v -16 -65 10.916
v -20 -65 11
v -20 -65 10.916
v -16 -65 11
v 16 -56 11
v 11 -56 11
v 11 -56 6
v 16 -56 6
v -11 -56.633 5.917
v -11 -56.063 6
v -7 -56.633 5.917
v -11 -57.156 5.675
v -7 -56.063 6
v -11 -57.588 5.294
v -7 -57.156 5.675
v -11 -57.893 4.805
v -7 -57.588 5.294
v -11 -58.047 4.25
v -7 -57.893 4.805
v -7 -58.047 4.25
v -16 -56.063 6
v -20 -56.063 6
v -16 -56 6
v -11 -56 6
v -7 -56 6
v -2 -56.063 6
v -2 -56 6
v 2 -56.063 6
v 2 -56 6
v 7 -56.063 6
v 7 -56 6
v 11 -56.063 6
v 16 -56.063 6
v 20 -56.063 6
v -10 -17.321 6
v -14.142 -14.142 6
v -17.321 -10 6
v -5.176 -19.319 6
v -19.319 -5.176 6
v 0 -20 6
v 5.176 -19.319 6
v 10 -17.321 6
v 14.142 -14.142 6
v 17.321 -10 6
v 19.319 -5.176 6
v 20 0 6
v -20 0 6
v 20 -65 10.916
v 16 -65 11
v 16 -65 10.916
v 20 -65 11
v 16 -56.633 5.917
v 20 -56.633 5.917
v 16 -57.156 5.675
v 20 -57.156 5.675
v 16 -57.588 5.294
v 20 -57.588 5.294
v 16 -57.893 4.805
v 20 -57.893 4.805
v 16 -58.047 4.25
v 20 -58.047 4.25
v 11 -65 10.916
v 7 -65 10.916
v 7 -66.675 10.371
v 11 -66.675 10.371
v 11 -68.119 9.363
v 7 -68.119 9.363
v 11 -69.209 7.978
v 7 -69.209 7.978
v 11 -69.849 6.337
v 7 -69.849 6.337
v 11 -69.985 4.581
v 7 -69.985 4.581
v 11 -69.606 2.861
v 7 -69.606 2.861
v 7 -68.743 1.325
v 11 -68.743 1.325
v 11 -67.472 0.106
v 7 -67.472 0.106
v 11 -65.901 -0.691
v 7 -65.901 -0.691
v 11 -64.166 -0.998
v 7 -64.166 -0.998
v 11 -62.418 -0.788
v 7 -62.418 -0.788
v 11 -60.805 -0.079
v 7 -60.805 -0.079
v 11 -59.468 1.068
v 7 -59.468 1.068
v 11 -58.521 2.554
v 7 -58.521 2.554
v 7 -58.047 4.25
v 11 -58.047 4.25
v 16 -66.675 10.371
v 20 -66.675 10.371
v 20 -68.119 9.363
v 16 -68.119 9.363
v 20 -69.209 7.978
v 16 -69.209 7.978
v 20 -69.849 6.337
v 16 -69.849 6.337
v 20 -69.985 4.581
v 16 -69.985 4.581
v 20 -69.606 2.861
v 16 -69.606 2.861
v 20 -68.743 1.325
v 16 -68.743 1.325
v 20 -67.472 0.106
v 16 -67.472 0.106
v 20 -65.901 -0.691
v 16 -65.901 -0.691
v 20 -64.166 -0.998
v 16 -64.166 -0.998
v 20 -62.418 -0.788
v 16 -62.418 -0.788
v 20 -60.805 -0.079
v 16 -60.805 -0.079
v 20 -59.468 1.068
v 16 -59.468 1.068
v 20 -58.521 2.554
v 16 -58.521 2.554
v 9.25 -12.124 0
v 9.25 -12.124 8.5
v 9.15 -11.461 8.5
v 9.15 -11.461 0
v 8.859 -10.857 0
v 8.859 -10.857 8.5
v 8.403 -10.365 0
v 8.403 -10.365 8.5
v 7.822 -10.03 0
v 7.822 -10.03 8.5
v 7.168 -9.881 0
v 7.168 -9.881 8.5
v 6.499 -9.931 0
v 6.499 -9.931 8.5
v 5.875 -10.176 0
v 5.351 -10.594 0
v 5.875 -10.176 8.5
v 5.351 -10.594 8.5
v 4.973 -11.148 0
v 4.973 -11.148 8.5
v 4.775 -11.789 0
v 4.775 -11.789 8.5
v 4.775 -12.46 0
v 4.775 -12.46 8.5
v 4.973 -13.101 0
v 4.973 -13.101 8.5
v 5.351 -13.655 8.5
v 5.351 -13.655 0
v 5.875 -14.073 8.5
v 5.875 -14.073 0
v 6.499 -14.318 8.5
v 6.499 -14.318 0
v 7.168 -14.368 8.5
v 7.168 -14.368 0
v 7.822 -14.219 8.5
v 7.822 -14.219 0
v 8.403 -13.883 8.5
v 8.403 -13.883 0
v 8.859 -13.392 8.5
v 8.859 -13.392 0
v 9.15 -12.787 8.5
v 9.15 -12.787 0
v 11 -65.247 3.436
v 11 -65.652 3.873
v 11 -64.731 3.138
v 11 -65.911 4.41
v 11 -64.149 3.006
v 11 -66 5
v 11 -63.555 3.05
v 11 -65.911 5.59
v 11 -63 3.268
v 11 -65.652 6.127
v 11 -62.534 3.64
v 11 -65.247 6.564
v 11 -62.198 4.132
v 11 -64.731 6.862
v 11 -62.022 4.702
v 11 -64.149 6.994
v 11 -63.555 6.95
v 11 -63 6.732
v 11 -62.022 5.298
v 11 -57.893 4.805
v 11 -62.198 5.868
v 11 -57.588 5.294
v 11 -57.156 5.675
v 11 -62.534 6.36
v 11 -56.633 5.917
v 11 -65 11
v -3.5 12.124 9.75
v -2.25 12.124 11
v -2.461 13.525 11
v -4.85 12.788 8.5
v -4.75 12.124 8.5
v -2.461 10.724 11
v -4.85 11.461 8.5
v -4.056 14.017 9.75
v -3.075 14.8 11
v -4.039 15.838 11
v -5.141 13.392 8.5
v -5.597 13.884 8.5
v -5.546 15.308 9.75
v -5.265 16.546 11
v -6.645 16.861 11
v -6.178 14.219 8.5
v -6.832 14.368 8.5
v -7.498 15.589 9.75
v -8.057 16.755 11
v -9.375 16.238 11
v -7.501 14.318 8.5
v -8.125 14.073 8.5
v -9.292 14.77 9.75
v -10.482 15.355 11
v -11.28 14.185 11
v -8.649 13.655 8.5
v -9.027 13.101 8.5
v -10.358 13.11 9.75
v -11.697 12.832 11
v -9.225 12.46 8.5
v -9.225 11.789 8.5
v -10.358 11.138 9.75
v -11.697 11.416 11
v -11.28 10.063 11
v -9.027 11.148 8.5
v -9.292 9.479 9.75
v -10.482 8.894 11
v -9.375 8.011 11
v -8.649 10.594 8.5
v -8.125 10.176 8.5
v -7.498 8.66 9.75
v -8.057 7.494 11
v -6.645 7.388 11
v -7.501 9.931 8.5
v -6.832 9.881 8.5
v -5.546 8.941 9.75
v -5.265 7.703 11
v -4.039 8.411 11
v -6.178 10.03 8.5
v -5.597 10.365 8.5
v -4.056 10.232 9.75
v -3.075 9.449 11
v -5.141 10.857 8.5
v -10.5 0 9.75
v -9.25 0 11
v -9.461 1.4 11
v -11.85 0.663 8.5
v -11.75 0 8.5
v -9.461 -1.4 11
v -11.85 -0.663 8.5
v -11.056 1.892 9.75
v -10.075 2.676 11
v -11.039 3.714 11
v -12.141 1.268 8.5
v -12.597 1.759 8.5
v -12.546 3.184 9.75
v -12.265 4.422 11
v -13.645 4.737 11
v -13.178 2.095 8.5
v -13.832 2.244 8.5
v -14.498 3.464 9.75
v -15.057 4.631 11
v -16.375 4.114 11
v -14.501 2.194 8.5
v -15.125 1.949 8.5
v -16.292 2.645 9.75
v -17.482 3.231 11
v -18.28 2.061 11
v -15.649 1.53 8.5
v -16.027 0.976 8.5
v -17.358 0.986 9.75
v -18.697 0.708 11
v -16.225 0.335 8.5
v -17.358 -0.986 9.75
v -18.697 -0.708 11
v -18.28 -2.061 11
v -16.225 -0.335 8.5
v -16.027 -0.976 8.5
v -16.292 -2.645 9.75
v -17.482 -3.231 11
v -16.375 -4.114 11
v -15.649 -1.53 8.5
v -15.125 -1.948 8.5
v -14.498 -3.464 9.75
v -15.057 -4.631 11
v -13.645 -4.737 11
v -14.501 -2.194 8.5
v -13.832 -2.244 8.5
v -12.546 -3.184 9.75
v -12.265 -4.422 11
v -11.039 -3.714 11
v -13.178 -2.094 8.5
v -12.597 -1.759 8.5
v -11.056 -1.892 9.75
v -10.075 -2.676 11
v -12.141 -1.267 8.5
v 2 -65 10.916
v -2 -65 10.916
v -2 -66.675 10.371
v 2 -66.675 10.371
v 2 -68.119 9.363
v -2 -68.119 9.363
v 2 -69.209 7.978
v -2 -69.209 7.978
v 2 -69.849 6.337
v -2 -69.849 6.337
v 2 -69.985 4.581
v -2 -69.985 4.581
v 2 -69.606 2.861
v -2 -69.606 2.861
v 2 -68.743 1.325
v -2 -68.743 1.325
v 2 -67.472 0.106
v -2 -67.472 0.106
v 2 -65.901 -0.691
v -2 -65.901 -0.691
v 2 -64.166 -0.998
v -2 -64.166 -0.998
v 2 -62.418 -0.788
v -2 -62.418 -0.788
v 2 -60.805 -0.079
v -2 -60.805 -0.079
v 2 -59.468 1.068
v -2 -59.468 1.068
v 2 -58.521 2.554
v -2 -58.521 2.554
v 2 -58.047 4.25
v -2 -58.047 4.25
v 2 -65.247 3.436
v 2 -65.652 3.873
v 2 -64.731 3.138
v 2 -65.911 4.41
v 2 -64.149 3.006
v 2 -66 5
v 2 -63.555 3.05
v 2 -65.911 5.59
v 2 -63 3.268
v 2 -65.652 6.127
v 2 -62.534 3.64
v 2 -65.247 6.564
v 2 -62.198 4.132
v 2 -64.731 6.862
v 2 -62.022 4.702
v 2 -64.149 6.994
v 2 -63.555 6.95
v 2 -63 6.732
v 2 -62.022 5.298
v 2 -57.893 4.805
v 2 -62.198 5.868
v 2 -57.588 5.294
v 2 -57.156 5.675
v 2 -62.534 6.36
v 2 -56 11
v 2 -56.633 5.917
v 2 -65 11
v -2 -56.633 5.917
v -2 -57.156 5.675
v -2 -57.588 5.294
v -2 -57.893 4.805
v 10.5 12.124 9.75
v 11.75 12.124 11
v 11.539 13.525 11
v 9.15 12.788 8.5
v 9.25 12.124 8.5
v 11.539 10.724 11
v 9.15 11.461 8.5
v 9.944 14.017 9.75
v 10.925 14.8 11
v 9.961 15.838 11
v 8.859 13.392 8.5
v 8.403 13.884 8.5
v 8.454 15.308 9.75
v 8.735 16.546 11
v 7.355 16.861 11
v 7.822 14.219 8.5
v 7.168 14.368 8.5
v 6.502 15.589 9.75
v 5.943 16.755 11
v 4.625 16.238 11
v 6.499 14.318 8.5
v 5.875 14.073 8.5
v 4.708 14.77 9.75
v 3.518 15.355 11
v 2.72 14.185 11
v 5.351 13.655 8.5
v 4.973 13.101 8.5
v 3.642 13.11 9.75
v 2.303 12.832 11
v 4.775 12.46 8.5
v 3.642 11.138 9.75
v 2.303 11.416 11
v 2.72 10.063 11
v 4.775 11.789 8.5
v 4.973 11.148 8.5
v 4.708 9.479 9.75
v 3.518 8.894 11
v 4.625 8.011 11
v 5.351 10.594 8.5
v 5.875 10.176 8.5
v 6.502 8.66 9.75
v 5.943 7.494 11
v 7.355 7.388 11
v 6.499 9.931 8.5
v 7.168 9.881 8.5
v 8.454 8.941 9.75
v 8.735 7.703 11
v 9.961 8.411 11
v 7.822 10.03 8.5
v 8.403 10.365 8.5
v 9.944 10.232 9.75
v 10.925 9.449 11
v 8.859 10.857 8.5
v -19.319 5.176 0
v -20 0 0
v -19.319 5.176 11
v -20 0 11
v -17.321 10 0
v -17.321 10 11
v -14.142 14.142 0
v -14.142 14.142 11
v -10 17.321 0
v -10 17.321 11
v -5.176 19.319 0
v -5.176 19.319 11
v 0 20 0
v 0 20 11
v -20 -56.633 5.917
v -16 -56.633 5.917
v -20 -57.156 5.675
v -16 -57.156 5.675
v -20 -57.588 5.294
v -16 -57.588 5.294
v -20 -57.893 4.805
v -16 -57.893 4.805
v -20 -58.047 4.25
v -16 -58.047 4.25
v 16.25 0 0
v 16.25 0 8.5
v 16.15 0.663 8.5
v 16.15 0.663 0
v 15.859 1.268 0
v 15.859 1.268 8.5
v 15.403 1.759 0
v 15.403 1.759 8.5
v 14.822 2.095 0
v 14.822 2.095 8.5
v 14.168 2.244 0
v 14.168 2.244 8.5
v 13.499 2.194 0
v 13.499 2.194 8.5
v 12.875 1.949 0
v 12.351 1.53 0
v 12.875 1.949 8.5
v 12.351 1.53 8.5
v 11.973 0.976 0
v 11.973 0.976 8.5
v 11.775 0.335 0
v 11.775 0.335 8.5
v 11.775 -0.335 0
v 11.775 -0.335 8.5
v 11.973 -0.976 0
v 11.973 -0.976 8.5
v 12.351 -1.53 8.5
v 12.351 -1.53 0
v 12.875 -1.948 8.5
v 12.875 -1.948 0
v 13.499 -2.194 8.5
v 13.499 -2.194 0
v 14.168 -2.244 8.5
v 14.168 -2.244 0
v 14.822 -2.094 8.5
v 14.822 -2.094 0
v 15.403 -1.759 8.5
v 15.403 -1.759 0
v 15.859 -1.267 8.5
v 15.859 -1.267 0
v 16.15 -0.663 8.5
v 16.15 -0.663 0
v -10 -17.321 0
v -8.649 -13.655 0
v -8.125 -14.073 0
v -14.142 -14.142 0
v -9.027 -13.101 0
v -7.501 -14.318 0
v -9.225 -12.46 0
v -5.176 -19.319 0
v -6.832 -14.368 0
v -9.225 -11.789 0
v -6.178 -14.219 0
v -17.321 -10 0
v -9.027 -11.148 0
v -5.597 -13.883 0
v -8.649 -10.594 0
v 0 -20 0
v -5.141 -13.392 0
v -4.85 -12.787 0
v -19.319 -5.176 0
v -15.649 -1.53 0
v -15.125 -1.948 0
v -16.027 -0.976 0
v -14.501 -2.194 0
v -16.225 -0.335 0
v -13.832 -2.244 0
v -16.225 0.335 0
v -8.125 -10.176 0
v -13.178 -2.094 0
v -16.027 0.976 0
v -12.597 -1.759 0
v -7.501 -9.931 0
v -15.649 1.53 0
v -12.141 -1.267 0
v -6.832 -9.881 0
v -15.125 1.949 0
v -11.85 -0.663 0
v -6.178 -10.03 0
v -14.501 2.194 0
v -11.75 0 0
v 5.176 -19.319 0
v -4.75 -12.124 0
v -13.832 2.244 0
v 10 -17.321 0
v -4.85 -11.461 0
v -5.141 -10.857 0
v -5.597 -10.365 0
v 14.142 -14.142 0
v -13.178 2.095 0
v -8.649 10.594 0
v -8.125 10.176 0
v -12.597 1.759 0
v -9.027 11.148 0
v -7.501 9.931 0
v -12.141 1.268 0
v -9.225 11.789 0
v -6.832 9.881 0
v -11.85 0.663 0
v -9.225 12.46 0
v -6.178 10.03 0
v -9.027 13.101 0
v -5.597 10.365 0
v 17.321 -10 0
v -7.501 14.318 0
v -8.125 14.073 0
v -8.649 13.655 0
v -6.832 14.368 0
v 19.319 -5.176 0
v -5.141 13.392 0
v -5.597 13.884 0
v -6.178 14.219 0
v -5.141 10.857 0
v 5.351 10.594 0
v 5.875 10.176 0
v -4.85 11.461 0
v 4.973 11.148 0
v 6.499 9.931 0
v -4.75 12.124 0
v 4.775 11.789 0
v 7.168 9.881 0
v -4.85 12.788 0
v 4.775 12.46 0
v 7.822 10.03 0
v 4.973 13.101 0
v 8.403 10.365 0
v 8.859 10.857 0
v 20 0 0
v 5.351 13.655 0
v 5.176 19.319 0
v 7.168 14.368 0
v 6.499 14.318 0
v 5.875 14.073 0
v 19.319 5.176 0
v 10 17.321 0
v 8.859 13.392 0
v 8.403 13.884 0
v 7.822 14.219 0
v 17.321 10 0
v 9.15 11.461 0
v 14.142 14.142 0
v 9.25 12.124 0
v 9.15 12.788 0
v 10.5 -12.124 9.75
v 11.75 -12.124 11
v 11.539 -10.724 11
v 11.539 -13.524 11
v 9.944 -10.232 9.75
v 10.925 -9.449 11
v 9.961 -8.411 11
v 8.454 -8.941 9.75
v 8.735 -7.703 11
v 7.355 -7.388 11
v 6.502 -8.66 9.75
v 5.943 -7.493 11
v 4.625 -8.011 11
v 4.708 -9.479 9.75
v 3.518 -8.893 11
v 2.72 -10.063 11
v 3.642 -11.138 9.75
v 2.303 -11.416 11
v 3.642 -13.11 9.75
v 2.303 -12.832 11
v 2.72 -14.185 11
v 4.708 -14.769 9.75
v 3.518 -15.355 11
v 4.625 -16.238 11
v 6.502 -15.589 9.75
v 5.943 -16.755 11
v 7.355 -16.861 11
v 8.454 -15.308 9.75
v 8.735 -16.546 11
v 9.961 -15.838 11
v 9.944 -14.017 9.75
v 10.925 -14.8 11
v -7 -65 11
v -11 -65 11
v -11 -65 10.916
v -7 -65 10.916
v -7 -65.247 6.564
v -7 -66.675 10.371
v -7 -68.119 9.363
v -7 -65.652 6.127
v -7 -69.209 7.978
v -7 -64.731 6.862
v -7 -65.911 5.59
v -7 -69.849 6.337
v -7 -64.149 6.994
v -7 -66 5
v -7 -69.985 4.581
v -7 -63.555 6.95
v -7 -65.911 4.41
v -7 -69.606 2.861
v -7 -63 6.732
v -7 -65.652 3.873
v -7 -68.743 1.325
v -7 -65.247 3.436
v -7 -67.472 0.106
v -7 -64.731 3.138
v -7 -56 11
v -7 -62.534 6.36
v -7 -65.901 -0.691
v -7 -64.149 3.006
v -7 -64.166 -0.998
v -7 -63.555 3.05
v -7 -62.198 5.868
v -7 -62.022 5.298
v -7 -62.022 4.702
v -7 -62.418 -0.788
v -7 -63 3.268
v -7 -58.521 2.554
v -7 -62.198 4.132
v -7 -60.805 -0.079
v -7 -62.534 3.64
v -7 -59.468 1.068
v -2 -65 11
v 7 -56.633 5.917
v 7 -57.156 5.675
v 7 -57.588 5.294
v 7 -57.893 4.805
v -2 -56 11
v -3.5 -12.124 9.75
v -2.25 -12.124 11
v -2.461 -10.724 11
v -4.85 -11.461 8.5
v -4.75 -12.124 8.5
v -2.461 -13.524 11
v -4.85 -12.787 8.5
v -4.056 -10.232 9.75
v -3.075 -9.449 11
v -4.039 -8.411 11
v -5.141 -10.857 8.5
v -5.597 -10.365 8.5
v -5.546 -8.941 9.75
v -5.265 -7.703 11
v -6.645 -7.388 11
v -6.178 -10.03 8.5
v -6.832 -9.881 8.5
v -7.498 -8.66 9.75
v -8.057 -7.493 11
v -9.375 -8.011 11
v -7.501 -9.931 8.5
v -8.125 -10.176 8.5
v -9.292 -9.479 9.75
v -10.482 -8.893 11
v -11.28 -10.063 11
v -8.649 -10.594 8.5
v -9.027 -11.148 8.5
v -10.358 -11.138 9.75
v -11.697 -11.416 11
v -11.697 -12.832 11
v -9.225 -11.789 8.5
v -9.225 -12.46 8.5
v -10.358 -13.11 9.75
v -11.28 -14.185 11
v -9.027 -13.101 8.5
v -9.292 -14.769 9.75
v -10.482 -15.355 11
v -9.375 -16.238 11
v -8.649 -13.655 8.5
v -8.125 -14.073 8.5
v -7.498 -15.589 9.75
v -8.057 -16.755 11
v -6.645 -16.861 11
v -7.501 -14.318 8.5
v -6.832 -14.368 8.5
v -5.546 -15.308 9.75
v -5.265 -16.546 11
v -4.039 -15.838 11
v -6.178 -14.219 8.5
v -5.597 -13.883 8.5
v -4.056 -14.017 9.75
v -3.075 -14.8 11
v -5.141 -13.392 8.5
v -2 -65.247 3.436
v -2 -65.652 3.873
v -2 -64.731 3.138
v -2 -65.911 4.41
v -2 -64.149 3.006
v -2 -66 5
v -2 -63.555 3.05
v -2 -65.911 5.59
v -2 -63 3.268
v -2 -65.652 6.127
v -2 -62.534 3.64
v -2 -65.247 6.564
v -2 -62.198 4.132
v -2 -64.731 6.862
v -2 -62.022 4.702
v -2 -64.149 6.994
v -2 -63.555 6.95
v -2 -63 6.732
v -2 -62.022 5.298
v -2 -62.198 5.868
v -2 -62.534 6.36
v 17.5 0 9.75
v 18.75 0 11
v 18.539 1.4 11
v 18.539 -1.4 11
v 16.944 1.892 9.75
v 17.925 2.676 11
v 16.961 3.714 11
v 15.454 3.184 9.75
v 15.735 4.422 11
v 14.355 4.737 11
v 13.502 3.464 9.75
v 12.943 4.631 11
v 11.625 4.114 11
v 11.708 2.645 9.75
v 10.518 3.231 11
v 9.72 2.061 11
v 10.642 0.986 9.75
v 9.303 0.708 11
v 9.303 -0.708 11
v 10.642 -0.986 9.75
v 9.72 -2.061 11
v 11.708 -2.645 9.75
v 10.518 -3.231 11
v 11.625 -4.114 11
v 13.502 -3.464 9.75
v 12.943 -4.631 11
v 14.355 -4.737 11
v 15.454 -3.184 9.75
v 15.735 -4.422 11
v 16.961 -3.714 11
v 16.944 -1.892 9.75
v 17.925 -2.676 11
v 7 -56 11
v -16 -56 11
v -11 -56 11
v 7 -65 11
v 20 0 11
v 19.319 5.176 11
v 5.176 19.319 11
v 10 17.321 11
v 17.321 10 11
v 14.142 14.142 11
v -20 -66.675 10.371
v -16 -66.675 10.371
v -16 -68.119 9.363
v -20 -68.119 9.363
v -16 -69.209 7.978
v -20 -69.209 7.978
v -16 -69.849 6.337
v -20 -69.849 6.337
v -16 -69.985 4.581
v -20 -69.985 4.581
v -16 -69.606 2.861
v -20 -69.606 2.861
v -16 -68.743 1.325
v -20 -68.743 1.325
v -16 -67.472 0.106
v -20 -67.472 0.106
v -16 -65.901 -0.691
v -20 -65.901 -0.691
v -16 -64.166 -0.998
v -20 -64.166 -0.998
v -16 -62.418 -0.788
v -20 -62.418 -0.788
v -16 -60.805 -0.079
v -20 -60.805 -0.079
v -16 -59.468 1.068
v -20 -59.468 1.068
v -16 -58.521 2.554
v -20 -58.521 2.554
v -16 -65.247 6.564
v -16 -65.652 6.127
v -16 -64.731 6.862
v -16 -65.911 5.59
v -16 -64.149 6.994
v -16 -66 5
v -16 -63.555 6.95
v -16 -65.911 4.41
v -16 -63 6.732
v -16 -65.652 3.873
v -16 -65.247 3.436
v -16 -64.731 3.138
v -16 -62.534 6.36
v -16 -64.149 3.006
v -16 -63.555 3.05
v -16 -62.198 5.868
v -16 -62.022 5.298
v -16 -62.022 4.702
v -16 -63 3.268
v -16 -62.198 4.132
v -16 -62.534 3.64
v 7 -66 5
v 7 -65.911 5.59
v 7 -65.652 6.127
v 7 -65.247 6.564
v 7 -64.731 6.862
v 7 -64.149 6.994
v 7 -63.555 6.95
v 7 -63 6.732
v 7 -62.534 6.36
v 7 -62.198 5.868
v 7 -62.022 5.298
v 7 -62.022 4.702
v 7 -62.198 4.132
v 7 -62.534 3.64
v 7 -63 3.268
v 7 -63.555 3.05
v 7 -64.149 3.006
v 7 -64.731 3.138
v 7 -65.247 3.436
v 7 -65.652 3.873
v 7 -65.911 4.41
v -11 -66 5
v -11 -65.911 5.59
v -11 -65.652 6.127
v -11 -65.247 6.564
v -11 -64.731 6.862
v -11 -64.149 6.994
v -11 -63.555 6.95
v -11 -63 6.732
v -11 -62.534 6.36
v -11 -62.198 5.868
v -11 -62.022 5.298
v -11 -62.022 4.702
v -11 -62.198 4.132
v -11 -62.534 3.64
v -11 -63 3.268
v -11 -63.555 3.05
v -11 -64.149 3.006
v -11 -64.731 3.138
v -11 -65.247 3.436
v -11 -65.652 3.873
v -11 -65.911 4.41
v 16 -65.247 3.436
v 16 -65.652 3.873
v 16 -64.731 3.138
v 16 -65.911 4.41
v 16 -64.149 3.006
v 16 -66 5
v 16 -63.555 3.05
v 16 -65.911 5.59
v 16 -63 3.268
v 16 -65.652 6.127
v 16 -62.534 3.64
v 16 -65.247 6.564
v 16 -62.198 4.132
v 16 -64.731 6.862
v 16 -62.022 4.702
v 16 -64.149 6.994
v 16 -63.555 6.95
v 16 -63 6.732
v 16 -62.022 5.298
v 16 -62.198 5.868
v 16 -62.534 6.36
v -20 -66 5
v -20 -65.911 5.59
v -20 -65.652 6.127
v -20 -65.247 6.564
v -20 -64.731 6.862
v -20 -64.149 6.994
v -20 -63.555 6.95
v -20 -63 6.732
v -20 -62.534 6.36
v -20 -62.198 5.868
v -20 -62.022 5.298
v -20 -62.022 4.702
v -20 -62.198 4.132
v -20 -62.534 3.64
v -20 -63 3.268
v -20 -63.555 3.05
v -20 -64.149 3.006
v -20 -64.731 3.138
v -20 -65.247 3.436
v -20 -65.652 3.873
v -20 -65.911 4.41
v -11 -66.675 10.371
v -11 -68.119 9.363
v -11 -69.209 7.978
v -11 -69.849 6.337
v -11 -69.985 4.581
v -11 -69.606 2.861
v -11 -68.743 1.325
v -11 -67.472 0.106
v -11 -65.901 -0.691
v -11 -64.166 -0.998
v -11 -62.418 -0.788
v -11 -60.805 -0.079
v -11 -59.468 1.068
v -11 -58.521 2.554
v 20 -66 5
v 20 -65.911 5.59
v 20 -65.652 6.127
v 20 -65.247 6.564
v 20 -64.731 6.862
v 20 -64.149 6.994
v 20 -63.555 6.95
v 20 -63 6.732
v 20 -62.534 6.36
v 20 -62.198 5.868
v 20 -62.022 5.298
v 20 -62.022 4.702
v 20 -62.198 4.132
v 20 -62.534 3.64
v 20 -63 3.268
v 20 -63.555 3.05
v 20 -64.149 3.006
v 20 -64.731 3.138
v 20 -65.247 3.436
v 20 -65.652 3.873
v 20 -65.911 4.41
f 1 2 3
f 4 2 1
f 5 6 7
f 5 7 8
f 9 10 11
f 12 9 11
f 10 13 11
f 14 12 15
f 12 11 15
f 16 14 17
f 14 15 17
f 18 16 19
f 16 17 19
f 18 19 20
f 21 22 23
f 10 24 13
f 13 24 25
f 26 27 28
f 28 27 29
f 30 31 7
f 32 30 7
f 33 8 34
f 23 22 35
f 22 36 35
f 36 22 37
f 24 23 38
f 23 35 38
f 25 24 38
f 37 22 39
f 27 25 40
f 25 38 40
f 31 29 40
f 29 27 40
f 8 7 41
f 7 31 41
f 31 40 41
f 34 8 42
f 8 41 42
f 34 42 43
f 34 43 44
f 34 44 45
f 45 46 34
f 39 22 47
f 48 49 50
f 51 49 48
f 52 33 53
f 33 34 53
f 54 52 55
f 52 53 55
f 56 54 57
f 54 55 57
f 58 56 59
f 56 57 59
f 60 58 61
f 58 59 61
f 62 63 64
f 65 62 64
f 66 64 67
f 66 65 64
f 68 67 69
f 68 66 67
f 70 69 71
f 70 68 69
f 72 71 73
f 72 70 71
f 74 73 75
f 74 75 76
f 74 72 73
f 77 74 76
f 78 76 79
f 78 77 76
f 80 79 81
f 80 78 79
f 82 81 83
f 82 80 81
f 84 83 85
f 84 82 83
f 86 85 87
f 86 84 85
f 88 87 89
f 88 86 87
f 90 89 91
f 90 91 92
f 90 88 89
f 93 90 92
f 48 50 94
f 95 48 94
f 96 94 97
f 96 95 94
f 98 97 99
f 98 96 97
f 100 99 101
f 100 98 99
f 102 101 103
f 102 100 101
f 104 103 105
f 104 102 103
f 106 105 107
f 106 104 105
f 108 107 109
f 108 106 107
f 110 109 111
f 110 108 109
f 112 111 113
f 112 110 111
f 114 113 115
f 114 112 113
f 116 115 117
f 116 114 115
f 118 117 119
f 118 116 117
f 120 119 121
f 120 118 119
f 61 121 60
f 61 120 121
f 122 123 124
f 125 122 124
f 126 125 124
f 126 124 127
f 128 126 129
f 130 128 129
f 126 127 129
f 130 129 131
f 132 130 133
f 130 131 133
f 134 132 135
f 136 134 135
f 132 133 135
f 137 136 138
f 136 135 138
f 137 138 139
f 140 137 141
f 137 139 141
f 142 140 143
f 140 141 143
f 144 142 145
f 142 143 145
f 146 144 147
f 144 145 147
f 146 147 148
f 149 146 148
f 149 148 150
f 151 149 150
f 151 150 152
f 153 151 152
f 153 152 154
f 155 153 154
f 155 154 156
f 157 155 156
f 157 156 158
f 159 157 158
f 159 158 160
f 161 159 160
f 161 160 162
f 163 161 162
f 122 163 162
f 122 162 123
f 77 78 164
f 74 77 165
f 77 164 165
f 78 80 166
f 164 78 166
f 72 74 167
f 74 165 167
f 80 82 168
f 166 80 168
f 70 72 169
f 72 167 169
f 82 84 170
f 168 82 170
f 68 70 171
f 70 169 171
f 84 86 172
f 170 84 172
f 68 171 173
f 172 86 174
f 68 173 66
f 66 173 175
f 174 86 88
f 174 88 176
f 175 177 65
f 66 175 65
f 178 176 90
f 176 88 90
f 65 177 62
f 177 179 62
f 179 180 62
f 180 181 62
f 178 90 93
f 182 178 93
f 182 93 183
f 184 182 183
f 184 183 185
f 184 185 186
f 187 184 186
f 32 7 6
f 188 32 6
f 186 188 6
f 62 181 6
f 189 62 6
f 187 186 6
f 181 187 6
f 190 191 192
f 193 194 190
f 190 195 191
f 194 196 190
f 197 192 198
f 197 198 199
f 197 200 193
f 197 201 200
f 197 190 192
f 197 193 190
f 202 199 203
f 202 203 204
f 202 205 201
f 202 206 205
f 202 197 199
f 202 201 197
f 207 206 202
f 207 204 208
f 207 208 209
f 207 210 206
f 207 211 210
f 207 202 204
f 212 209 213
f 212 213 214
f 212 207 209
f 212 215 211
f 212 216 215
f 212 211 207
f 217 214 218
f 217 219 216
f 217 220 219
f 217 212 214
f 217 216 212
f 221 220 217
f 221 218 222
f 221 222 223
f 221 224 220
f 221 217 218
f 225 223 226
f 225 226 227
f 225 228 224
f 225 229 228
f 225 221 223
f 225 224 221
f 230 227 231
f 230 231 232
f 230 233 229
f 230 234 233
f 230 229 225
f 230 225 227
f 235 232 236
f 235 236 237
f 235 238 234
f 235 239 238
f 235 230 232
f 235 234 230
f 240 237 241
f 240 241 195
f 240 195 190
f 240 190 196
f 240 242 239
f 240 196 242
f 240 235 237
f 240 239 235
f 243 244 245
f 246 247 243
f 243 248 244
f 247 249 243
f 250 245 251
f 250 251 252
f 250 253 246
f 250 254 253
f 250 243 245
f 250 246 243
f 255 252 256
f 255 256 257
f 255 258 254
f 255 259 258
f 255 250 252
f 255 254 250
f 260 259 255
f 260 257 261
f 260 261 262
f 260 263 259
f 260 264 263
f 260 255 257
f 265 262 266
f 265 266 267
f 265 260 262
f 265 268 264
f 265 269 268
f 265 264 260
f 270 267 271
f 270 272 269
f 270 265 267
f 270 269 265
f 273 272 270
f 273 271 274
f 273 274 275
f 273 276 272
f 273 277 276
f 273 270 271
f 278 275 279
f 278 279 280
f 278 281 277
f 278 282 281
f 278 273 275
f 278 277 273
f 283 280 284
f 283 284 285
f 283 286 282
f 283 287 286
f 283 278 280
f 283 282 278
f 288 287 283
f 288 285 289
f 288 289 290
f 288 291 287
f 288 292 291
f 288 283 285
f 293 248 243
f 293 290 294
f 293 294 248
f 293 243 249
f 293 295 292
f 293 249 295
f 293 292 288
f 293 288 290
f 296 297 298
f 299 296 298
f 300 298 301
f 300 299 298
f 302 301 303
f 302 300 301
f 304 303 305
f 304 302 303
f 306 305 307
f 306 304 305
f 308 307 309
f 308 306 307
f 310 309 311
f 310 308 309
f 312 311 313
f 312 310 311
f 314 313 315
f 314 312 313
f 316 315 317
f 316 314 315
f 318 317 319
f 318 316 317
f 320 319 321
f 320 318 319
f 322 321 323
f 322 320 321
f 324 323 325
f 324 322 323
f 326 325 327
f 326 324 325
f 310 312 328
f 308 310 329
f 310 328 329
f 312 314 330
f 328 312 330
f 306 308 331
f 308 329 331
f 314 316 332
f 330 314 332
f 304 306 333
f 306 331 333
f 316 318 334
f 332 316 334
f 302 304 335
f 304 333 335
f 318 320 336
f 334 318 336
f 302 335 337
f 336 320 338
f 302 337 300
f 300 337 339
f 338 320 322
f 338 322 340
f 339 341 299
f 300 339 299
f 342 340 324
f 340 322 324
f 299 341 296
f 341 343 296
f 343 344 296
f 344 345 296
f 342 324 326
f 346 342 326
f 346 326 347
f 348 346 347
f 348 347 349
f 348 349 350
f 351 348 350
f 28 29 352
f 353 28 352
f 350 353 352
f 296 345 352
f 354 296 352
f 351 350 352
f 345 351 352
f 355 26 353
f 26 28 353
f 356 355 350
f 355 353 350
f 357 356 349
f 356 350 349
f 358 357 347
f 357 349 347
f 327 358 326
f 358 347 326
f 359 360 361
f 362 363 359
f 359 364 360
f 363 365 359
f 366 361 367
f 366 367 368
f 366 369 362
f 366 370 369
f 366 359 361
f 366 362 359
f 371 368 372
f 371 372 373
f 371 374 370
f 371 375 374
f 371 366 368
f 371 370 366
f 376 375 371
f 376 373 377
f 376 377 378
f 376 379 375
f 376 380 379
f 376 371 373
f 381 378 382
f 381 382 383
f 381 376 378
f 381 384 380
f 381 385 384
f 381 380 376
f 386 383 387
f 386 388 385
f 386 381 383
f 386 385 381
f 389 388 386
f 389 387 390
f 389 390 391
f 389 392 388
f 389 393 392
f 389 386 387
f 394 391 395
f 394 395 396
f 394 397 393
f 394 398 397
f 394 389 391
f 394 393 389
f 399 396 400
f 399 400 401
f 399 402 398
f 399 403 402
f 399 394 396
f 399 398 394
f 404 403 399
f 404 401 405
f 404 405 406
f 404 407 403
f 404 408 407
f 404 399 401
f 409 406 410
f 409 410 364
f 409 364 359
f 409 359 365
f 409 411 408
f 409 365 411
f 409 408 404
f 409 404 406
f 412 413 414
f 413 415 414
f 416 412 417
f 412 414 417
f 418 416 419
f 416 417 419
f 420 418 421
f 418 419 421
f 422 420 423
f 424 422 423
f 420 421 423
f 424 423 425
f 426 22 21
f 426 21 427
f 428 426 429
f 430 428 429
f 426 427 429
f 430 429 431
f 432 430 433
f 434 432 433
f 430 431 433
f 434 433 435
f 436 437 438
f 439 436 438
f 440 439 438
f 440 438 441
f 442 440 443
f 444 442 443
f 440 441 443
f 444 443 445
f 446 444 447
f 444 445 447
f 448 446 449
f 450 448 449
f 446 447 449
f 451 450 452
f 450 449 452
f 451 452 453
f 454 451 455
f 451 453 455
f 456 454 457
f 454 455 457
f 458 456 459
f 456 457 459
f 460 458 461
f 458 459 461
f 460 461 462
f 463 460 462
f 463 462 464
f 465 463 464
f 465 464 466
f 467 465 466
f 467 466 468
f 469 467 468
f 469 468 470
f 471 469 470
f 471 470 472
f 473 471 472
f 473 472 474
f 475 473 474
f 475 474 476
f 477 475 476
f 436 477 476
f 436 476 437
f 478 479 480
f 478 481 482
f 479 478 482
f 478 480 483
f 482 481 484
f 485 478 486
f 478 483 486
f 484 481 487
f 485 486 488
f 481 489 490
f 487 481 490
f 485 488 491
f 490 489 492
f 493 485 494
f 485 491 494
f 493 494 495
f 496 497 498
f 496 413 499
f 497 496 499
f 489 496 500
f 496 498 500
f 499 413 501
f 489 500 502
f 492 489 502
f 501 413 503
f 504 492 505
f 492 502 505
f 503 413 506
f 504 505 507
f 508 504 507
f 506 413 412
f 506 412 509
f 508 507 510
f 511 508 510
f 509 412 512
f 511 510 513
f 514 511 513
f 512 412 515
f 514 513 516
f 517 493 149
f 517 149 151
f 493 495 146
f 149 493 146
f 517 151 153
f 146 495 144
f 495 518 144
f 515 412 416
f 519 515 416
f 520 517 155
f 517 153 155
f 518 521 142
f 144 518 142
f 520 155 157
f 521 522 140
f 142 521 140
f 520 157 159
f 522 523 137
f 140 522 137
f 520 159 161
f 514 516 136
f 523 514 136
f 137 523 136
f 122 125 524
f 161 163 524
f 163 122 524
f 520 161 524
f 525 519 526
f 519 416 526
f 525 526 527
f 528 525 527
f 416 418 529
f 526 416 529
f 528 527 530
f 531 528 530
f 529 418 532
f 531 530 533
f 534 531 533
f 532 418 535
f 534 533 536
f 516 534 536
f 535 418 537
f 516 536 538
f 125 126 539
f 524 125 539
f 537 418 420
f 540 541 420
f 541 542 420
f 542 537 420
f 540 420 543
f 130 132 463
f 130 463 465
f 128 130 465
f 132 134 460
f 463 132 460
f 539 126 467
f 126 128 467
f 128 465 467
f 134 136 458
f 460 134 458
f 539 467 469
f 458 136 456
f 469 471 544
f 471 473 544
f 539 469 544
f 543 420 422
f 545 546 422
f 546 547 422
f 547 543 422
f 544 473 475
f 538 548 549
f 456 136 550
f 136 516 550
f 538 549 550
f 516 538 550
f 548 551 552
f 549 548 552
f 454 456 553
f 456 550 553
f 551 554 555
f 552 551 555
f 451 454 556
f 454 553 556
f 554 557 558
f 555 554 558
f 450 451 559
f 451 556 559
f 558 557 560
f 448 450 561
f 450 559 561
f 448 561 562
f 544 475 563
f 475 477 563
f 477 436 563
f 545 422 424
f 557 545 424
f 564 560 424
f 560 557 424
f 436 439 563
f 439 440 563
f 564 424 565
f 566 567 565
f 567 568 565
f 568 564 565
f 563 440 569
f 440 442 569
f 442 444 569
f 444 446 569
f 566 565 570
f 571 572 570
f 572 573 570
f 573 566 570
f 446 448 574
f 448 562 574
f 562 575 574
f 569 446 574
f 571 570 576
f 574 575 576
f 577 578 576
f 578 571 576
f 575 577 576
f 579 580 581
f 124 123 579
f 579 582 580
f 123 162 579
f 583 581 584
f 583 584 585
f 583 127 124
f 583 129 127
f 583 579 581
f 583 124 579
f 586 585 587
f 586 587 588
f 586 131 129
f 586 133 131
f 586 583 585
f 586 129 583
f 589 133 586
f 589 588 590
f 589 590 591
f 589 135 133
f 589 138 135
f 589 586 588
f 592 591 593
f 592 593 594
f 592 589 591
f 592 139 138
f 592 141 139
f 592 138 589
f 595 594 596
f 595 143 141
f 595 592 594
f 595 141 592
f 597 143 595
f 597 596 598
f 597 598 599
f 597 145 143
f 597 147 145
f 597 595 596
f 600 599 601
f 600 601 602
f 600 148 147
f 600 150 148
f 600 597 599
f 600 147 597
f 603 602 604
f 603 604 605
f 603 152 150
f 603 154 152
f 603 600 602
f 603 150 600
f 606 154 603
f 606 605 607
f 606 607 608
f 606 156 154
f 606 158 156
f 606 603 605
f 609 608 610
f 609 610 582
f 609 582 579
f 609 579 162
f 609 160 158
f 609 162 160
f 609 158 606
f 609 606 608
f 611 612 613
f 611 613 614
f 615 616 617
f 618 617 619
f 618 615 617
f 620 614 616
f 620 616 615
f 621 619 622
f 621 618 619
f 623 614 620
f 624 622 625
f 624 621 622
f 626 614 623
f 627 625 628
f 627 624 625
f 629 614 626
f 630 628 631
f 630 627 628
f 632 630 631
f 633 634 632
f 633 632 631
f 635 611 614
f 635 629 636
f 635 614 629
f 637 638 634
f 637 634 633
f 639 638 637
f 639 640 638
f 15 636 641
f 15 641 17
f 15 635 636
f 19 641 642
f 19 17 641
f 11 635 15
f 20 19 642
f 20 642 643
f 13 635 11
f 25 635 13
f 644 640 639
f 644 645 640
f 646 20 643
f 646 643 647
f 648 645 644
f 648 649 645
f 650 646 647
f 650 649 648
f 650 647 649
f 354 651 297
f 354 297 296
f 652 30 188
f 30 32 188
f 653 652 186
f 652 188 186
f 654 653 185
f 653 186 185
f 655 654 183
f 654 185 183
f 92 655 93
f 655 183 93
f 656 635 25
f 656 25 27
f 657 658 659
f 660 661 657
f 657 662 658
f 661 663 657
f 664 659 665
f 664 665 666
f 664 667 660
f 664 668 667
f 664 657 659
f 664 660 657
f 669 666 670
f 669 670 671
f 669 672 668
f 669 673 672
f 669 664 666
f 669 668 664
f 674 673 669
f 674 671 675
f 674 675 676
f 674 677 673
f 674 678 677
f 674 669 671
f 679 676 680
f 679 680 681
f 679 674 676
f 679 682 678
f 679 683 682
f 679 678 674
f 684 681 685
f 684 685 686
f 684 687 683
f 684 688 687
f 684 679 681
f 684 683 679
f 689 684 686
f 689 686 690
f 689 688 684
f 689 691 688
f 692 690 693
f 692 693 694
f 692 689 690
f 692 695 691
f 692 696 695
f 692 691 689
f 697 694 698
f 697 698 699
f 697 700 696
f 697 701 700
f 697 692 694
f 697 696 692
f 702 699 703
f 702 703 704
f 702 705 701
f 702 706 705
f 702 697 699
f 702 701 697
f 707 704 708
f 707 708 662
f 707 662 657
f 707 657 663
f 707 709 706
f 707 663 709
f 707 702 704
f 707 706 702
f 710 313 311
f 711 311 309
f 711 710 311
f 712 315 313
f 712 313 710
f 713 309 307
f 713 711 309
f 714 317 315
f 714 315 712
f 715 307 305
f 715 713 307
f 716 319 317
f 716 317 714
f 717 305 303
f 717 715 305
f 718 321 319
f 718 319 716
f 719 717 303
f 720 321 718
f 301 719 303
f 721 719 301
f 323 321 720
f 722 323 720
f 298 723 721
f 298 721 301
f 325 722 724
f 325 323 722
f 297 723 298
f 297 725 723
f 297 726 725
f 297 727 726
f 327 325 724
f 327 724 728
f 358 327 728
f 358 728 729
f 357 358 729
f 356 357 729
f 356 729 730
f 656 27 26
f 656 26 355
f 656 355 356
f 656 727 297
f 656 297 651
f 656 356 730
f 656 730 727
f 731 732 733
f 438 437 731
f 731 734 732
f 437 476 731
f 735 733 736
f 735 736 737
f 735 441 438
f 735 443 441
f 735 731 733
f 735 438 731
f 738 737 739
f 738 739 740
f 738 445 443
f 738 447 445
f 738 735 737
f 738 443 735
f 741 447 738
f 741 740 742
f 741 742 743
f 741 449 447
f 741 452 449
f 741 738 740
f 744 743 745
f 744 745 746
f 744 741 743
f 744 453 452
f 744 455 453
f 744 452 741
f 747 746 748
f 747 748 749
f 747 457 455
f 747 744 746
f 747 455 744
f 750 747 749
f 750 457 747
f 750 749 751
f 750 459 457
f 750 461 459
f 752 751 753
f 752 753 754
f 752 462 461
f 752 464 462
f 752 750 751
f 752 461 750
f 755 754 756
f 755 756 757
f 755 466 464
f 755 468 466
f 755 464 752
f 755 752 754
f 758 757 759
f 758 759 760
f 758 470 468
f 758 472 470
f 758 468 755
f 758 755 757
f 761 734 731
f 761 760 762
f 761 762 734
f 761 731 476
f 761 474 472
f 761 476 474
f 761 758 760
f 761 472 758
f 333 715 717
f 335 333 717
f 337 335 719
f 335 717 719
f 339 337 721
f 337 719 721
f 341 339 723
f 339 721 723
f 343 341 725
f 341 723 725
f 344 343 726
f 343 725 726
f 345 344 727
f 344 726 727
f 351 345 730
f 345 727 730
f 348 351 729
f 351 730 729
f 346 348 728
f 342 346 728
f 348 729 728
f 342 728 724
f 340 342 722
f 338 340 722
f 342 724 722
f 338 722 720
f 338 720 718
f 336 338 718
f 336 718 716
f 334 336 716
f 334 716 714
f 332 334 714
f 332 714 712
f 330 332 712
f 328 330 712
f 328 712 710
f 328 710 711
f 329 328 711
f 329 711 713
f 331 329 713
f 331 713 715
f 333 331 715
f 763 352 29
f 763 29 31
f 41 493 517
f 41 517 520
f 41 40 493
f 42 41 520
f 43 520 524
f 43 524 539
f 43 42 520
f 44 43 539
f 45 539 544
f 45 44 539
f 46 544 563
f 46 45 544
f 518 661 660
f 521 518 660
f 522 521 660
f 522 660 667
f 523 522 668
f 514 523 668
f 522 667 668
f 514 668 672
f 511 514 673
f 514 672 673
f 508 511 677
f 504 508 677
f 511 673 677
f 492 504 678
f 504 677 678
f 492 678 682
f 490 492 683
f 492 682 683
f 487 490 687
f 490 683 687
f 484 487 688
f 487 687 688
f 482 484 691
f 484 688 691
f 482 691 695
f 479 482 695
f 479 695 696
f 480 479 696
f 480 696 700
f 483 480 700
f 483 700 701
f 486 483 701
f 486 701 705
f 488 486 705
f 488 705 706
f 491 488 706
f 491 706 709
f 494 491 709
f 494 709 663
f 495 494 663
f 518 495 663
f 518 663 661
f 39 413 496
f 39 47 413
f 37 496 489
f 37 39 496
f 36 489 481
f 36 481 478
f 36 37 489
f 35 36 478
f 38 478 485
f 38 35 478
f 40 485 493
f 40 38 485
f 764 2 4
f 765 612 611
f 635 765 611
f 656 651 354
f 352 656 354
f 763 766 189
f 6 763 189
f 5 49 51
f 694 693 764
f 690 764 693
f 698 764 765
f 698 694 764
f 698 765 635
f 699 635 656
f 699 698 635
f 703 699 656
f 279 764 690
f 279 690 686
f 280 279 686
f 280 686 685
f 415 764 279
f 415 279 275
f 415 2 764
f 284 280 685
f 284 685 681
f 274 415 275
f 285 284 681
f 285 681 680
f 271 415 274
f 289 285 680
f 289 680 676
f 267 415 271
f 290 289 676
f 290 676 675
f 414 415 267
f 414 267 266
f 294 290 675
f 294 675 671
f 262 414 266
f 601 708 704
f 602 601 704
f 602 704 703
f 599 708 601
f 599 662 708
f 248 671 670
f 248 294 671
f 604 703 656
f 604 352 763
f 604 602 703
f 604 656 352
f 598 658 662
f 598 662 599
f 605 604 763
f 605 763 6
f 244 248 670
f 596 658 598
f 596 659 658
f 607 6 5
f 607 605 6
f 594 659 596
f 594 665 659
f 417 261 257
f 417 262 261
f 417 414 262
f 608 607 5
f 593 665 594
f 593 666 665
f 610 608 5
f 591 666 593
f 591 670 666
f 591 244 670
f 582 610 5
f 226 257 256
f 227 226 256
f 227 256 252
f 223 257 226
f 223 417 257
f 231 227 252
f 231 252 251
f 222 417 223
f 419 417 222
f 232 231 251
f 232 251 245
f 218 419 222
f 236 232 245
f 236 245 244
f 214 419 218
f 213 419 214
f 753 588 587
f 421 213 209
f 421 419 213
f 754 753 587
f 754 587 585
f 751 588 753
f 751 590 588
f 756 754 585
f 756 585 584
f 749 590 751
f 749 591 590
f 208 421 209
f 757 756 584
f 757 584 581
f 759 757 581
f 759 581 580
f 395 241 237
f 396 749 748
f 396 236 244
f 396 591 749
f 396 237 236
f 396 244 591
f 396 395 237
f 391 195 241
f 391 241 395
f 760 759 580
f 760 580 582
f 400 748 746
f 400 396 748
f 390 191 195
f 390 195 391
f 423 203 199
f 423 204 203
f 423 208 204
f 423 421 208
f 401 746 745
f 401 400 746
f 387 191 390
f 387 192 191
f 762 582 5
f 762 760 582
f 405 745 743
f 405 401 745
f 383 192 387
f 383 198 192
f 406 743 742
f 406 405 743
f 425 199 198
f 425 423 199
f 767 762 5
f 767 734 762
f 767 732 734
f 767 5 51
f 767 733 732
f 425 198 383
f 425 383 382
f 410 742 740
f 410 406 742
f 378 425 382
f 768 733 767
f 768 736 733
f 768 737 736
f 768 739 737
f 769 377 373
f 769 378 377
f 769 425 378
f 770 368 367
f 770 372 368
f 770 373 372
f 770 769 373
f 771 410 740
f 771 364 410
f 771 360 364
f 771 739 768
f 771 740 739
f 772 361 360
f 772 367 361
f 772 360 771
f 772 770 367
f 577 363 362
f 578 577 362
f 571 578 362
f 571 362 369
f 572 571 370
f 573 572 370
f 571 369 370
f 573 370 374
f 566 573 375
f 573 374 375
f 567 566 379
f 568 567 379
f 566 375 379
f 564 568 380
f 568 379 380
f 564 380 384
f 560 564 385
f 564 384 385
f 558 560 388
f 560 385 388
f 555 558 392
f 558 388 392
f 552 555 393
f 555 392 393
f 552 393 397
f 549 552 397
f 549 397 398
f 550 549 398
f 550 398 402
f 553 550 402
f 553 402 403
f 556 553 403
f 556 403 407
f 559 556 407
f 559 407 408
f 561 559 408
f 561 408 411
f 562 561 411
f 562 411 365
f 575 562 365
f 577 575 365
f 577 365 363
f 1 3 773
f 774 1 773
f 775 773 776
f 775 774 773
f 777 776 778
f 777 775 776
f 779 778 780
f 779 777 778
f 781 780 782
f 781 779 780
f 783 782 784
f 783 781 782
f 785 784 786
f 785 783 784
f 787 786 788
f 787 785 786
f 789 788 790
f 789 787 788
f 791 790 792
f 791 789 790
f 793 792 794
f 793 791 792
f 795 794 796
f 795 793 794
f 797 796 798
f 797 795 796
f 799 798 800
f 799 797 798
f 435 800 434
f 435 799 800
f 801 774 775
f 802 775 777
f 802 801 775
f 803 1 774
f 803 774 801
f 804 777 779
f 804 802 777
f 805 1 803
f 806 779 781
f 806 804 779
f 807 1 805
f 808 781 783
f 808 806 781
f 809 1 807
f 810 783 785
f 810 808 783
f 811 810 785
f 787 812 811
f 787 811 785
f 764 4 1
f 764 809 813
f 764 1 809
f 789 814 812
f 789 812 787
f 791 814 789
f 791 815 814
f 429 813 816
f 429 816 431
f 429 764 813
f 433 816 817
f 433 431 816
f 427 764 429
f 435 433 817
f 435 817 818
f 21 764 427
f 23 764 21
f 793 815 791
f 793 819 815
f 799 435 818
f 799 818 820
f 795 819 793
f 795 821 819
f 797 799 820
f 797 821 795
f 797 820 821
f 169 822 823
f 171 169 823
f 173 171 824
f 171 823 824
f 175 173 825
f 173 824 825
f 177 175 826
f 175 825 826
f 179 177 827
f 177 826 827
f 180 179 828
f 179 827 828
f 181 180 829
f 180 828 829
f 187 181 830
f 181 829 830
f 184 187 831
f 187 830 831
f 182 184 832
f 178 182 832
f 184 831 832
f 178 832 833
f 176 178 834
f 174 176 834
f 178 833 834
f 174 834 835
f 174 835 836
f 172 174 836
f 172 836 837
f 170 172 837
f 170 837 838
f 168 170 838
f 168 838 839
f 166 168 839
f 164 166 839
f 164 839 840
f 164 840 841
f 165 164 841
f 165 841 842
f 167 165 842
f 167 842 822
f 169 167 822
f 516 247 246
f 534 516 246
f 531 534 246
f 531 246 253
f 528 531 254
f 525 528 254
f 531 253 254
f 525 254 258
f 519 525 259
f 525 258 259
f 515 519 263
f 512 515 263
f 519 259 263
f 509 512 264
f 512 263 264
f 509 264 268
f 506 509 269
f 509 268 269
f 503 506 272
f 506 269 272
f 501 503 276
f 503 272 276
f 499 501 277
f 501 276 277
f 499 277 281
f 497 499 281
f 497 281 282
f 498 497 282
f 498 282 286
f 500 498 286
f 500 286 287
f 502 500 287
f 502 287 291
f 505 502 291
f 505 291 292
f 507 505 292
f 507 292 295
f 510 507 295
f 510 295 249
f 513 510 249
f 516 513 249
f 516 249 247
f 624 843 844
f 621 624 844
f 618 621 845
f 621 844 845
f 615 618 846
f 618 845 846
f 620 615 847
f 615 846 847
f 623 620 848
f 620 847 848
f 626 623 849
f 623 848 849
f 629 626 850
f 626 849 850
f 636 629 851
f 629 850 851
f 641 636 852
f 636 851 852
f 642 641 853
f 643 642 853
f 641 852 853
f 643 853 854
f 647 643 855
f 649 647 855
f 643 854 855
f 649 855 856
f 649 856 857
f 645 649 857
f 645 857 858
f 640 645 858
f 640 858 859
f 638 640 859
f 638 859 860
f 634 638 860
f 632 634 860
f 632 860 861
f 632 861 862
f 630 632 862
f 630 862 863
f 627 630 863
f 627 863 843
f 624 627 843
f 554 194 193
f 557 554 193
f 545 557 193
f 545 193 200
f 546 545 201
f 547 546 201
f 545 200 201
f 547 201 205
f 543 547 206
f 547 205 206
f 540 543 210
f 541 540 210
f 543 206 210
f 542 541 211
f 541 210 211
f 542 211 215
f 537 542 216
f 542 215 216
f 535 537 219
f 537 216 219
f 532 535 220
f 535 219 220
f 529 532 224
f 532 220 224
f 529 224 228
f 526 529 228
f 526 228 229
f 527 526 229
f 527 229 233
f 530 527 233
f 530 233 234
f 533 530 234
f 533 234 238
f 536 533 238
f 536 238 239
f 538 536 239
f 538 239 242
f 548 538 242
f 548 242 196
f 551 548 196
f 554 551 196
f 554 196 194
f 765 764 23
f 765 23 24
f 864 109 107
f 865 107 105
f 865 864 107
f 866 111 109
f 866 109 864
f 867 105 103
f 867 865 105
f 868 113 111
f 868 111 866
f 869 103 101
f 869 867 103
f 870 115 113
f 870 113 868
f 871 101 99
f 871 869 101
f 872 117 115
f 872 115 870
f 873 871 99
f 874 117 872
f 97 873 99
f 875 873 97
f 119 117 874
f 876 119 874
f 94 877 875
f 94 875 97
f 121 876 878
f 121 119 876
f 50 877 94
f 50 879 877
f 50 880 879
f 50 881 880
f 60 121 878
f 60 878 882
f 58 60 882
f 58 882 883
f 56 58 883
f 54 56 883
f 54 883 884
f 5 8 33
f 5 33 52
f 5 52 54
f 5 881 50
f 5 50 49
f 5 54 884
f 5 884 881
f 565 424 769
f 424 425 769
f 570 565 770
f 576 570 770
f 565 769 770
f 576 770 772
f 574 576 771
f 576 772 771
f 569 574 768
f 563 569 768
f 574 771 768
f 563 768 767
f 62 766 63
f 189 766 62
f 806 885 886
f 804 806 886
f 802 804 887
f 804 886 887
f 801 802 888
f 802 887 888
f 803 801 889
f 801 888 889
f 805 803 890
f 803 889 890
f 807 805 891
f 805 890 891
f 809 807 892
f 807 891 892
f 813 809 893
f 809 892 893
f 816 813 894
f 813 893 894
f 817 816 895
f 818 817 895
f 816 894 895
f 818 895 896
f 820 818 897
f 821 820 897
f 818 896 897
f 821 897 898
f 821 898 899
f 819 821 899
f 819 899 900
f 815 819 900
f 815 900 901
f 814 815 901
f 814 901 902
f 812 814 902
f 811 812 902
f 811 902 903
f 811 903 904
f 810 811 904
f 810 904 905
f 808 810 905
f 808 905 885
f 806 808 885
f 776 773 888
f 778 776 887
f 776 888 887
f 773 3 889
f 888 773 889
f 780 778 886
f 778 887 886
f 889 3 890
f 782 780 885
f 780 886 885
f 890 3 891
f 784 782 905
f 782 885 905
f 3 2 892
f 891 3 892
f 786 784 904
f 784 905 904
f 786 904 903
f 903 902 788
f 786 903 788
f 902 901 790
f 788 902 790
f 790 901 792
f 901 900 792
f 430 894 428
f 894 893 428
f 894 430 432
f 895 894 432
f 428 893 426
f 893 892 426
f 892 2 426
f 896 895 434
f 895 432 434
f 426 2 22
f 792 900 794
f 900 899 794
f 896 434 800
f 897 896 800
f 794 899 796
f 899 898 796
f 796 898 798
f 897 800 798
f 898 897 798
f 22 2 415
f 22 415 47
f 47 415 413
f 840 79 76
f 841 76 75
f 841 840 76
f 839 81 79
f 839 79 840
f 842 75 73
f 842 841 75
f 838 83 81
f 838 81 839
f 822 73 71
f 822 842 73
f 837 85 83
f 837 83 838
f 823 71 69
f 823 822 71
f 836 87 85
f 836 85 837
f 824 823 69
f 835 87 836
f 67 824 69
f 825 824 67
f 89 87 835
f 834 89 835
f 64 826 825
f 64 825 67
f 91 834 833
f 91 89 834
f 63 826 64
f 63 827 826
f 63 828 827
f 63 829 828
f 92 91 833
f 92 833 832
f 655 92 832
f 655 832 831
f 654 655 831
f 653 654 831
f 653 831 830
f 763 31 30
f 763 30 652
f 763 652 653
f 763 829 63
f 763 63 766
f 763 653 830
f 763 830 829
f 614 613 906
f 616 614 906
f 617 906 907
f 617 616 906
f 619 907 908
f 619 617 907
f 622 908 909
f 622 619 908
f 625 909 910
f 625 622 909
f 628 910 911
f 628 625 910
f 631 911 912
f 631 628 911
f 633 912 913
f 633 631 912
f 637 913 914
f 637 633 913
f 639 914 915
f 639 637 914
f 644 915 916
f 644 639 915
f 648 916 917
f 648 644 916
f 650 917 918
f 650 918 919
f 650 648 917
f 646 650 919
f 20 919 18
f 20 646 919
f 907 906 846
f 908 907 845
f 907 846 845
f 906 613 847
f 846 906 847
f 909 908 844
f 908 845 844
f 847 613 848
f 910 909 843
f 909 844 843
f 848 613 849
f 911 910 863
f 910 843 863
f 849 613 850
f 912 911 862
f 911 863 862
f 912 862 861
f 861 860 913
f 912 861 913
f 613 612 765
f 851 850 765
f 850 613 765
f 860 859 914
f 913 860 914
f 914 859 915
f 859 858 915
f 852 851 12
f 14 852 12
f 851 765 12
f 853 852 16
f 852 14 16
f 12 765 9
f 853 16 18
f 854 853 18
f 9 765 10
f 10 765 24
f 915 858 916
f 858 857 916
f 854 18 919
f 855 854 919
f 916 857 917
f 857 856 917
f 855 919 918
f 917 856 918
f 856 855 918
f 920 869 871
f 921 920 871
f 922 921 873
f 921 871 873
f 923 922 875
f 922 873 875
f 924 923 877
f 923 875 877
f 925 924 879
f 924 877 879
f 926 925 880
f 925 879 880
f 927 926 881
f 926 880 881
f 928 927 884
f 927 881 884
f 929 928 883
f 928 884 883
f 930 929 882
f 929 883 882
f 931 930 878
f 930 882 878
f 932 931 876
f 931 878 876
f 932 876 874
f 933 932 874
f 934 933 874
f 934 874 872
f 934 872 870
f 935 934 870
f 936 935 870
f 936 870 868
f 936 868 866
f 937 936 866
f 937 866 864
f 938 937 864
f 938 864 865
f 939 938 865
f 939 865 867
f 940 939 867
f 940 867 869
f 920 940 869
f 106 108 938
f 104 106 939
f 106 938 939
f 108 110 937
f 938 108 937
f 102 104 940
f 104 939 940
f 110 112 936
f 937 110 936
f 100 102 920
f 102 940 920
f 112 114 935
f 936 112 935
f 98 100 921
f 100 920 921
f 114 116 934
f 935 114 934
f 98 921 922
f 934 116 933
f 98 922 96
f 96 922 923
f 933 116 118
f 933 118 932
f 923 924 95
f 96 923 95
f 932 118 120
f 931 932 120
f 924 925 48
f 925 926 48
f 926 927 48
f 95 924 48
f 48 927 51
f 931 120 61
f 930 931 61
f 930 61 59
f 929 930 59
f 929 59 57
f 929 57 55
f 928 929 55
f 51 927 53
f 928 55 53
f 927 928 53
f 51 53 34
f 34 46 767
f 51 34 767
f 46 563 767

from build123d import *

# Parameters (mm, degrees)
SKETCH7_W           = 40
SKETCH7_H           = 40
BOSS_EXTRUDE1_DEPTH = 11
SKETCH8_W           = 40
SKETCH8_H           = 5
BOSS_EXTRUDE2_DEPTH = 36
SKETCH10_R          = 2.25
CUT_EXTRUDE1_DEPTH  = 25
FILLET1_R           = 20
SKETCH11_W          = 4
SKETCH11_H          = 5
BOSS_EXTRUDE3_DEPTH = 9
SKETCH14_R          = 6
BOSS_EXTRUDE4_DEPTH = 4
LPATTERN1_COUNT     = 5
LPATTERN1_PITCH     = 9
SKETCH15_R          = 2
CUT_EXTRUDE2_DEPTH  = 82.369527466
CHAMFER1_SIZE       = 2.5
FILLET2_R           = 2


with BuildPart() as part:
    # Sketch7 → Boss-Extrude1 (new body)
    with BuildSketch(Plane.XY):
        Rectangle(SKETCH7_W, SKETCH7_H)
    extrude(amount=BOSS_EXTRUDE1_DEPTH)

    # Sketch8 → Boss-Extrude2 (add)
    with BuildSketch(Plane.XZ.offset(20)):
        with Locations((0, 8.5)):
            Rectangle(SKETCH8_W, SKETCH8_H)
    extrude(amount=BOSS_EXTRUDE2_DEPTH)

    # Sketch10 → Cut-Extrude1 (cut)
    with BuildSketch(Plane.XY.offset(11)):
        with Locations((-7.00009521, 12.124420806)):
            Circle(SKETCH10_R)
        with Locations((6.99990479, 12.124420806)):
            Circle(SKETCH10_R)
        with Locations((13.99990479, 6.5153e-05)):
            Circle(SKETCH10_R)
        with Locations((6.99990479, -12.1242905)):
            Circle(SKETCH10_R)
        with Locations((-7.00009521, -12.1242905)):
            Circle(SKETCH10_R)
        with Locations((-14.00009521, 6.5153e-05)):
            Circle(SKETCH10_R)
    extrude(amount=-CUT_EXTRUDE1_DEPTH, mode=Mode.SUBTRACT)

    # Fillet1
    fillet1_edges = [part.edges().sort_by_distance(p)[0] for p in [
        (20, -20, 3),
        (20, 20, 5.5),
        (-20, 20, 5.5),
        (-20, -20, 3),
    ]]
    fillet(fillet1_edges, radius=FILLET1_R - 0.0001)  # a hair under: the kernel refuses the full size

    # Sketch11 → Boss-Extrude3 (add)
    with BuildSketch(Plane.XZ.offset(56)):
        with Locations((-18, 8.5)):
            Rectangle(SKETCH11_W, SKETCH11_H)
    boss_extrude3 = extrude(amount=BOSS_EXTRUDE3_DEPTH)

    # Sketch14 → Boss-Extrude4 (add)
    with BuildSketch(Plane(origin=(-16, 0, 0), x_dir=(0, 0, -1), z_dir=(1, 0, 0))):
        with Locations((-5, -64)):
            Circle(SKETCH14_R)
    boss_extrude4 = extrude(amount=-BOSS_EXTRUDE4_DEPTH)

    # LPattern1: Boss-Extrude3, Boss-Extrude4 ×5
    with Locations(*[(i * LPATTERN1_PITCH, 0, 0) for i in range(1, LPATTERN1_COUNT)]):
        add(boss_extrude3)
        add(boss_extrude4)

    # Sketch15 → Cut-Extrude2 (cut, through all)
    with BuildSketch(Plane.ZY.offset(20)):
        with Locations(Location((5, -64, 0), (0, 0, 270))):
            Circle(SKETCH15_R)
    extrude(amount=-CUT_EXTRUDE2_DEPTH, mode=Mode.SUBTRACT)

    # Chamfer1
    chamfer1_edges = [part.edges().sort_by_distance(p)[0] for p in [
        (-16.25009521, 6.5153e-05, 11),
        (-9.25009521, -12.1242905, 11),
        (4.74990479, -12.1242905, 11),
        (11.74990479, 6.5153e-05, 11),
        (4.74990479, 12.124420806, 11),
        (-9.25009521, 12.124420806, 11),
    ]]
    chamfer(chamfer1_edges, length=CHAMFER1_SIZE)

    # Fillet2
    fillet2_edges = [part.edges().sort_by_distance(p)[0] for p in [
        (-18, -58.083920217, 6),
        (-9, -58.083920217, 6),
        (0, -58.083920217, 6),
        (9, -58.083920217, 6),
        (18, -58.083920217, 6),
    ]]
    fillet(fillet2_edges, radius=FILLET2_R)


solid = part.part
